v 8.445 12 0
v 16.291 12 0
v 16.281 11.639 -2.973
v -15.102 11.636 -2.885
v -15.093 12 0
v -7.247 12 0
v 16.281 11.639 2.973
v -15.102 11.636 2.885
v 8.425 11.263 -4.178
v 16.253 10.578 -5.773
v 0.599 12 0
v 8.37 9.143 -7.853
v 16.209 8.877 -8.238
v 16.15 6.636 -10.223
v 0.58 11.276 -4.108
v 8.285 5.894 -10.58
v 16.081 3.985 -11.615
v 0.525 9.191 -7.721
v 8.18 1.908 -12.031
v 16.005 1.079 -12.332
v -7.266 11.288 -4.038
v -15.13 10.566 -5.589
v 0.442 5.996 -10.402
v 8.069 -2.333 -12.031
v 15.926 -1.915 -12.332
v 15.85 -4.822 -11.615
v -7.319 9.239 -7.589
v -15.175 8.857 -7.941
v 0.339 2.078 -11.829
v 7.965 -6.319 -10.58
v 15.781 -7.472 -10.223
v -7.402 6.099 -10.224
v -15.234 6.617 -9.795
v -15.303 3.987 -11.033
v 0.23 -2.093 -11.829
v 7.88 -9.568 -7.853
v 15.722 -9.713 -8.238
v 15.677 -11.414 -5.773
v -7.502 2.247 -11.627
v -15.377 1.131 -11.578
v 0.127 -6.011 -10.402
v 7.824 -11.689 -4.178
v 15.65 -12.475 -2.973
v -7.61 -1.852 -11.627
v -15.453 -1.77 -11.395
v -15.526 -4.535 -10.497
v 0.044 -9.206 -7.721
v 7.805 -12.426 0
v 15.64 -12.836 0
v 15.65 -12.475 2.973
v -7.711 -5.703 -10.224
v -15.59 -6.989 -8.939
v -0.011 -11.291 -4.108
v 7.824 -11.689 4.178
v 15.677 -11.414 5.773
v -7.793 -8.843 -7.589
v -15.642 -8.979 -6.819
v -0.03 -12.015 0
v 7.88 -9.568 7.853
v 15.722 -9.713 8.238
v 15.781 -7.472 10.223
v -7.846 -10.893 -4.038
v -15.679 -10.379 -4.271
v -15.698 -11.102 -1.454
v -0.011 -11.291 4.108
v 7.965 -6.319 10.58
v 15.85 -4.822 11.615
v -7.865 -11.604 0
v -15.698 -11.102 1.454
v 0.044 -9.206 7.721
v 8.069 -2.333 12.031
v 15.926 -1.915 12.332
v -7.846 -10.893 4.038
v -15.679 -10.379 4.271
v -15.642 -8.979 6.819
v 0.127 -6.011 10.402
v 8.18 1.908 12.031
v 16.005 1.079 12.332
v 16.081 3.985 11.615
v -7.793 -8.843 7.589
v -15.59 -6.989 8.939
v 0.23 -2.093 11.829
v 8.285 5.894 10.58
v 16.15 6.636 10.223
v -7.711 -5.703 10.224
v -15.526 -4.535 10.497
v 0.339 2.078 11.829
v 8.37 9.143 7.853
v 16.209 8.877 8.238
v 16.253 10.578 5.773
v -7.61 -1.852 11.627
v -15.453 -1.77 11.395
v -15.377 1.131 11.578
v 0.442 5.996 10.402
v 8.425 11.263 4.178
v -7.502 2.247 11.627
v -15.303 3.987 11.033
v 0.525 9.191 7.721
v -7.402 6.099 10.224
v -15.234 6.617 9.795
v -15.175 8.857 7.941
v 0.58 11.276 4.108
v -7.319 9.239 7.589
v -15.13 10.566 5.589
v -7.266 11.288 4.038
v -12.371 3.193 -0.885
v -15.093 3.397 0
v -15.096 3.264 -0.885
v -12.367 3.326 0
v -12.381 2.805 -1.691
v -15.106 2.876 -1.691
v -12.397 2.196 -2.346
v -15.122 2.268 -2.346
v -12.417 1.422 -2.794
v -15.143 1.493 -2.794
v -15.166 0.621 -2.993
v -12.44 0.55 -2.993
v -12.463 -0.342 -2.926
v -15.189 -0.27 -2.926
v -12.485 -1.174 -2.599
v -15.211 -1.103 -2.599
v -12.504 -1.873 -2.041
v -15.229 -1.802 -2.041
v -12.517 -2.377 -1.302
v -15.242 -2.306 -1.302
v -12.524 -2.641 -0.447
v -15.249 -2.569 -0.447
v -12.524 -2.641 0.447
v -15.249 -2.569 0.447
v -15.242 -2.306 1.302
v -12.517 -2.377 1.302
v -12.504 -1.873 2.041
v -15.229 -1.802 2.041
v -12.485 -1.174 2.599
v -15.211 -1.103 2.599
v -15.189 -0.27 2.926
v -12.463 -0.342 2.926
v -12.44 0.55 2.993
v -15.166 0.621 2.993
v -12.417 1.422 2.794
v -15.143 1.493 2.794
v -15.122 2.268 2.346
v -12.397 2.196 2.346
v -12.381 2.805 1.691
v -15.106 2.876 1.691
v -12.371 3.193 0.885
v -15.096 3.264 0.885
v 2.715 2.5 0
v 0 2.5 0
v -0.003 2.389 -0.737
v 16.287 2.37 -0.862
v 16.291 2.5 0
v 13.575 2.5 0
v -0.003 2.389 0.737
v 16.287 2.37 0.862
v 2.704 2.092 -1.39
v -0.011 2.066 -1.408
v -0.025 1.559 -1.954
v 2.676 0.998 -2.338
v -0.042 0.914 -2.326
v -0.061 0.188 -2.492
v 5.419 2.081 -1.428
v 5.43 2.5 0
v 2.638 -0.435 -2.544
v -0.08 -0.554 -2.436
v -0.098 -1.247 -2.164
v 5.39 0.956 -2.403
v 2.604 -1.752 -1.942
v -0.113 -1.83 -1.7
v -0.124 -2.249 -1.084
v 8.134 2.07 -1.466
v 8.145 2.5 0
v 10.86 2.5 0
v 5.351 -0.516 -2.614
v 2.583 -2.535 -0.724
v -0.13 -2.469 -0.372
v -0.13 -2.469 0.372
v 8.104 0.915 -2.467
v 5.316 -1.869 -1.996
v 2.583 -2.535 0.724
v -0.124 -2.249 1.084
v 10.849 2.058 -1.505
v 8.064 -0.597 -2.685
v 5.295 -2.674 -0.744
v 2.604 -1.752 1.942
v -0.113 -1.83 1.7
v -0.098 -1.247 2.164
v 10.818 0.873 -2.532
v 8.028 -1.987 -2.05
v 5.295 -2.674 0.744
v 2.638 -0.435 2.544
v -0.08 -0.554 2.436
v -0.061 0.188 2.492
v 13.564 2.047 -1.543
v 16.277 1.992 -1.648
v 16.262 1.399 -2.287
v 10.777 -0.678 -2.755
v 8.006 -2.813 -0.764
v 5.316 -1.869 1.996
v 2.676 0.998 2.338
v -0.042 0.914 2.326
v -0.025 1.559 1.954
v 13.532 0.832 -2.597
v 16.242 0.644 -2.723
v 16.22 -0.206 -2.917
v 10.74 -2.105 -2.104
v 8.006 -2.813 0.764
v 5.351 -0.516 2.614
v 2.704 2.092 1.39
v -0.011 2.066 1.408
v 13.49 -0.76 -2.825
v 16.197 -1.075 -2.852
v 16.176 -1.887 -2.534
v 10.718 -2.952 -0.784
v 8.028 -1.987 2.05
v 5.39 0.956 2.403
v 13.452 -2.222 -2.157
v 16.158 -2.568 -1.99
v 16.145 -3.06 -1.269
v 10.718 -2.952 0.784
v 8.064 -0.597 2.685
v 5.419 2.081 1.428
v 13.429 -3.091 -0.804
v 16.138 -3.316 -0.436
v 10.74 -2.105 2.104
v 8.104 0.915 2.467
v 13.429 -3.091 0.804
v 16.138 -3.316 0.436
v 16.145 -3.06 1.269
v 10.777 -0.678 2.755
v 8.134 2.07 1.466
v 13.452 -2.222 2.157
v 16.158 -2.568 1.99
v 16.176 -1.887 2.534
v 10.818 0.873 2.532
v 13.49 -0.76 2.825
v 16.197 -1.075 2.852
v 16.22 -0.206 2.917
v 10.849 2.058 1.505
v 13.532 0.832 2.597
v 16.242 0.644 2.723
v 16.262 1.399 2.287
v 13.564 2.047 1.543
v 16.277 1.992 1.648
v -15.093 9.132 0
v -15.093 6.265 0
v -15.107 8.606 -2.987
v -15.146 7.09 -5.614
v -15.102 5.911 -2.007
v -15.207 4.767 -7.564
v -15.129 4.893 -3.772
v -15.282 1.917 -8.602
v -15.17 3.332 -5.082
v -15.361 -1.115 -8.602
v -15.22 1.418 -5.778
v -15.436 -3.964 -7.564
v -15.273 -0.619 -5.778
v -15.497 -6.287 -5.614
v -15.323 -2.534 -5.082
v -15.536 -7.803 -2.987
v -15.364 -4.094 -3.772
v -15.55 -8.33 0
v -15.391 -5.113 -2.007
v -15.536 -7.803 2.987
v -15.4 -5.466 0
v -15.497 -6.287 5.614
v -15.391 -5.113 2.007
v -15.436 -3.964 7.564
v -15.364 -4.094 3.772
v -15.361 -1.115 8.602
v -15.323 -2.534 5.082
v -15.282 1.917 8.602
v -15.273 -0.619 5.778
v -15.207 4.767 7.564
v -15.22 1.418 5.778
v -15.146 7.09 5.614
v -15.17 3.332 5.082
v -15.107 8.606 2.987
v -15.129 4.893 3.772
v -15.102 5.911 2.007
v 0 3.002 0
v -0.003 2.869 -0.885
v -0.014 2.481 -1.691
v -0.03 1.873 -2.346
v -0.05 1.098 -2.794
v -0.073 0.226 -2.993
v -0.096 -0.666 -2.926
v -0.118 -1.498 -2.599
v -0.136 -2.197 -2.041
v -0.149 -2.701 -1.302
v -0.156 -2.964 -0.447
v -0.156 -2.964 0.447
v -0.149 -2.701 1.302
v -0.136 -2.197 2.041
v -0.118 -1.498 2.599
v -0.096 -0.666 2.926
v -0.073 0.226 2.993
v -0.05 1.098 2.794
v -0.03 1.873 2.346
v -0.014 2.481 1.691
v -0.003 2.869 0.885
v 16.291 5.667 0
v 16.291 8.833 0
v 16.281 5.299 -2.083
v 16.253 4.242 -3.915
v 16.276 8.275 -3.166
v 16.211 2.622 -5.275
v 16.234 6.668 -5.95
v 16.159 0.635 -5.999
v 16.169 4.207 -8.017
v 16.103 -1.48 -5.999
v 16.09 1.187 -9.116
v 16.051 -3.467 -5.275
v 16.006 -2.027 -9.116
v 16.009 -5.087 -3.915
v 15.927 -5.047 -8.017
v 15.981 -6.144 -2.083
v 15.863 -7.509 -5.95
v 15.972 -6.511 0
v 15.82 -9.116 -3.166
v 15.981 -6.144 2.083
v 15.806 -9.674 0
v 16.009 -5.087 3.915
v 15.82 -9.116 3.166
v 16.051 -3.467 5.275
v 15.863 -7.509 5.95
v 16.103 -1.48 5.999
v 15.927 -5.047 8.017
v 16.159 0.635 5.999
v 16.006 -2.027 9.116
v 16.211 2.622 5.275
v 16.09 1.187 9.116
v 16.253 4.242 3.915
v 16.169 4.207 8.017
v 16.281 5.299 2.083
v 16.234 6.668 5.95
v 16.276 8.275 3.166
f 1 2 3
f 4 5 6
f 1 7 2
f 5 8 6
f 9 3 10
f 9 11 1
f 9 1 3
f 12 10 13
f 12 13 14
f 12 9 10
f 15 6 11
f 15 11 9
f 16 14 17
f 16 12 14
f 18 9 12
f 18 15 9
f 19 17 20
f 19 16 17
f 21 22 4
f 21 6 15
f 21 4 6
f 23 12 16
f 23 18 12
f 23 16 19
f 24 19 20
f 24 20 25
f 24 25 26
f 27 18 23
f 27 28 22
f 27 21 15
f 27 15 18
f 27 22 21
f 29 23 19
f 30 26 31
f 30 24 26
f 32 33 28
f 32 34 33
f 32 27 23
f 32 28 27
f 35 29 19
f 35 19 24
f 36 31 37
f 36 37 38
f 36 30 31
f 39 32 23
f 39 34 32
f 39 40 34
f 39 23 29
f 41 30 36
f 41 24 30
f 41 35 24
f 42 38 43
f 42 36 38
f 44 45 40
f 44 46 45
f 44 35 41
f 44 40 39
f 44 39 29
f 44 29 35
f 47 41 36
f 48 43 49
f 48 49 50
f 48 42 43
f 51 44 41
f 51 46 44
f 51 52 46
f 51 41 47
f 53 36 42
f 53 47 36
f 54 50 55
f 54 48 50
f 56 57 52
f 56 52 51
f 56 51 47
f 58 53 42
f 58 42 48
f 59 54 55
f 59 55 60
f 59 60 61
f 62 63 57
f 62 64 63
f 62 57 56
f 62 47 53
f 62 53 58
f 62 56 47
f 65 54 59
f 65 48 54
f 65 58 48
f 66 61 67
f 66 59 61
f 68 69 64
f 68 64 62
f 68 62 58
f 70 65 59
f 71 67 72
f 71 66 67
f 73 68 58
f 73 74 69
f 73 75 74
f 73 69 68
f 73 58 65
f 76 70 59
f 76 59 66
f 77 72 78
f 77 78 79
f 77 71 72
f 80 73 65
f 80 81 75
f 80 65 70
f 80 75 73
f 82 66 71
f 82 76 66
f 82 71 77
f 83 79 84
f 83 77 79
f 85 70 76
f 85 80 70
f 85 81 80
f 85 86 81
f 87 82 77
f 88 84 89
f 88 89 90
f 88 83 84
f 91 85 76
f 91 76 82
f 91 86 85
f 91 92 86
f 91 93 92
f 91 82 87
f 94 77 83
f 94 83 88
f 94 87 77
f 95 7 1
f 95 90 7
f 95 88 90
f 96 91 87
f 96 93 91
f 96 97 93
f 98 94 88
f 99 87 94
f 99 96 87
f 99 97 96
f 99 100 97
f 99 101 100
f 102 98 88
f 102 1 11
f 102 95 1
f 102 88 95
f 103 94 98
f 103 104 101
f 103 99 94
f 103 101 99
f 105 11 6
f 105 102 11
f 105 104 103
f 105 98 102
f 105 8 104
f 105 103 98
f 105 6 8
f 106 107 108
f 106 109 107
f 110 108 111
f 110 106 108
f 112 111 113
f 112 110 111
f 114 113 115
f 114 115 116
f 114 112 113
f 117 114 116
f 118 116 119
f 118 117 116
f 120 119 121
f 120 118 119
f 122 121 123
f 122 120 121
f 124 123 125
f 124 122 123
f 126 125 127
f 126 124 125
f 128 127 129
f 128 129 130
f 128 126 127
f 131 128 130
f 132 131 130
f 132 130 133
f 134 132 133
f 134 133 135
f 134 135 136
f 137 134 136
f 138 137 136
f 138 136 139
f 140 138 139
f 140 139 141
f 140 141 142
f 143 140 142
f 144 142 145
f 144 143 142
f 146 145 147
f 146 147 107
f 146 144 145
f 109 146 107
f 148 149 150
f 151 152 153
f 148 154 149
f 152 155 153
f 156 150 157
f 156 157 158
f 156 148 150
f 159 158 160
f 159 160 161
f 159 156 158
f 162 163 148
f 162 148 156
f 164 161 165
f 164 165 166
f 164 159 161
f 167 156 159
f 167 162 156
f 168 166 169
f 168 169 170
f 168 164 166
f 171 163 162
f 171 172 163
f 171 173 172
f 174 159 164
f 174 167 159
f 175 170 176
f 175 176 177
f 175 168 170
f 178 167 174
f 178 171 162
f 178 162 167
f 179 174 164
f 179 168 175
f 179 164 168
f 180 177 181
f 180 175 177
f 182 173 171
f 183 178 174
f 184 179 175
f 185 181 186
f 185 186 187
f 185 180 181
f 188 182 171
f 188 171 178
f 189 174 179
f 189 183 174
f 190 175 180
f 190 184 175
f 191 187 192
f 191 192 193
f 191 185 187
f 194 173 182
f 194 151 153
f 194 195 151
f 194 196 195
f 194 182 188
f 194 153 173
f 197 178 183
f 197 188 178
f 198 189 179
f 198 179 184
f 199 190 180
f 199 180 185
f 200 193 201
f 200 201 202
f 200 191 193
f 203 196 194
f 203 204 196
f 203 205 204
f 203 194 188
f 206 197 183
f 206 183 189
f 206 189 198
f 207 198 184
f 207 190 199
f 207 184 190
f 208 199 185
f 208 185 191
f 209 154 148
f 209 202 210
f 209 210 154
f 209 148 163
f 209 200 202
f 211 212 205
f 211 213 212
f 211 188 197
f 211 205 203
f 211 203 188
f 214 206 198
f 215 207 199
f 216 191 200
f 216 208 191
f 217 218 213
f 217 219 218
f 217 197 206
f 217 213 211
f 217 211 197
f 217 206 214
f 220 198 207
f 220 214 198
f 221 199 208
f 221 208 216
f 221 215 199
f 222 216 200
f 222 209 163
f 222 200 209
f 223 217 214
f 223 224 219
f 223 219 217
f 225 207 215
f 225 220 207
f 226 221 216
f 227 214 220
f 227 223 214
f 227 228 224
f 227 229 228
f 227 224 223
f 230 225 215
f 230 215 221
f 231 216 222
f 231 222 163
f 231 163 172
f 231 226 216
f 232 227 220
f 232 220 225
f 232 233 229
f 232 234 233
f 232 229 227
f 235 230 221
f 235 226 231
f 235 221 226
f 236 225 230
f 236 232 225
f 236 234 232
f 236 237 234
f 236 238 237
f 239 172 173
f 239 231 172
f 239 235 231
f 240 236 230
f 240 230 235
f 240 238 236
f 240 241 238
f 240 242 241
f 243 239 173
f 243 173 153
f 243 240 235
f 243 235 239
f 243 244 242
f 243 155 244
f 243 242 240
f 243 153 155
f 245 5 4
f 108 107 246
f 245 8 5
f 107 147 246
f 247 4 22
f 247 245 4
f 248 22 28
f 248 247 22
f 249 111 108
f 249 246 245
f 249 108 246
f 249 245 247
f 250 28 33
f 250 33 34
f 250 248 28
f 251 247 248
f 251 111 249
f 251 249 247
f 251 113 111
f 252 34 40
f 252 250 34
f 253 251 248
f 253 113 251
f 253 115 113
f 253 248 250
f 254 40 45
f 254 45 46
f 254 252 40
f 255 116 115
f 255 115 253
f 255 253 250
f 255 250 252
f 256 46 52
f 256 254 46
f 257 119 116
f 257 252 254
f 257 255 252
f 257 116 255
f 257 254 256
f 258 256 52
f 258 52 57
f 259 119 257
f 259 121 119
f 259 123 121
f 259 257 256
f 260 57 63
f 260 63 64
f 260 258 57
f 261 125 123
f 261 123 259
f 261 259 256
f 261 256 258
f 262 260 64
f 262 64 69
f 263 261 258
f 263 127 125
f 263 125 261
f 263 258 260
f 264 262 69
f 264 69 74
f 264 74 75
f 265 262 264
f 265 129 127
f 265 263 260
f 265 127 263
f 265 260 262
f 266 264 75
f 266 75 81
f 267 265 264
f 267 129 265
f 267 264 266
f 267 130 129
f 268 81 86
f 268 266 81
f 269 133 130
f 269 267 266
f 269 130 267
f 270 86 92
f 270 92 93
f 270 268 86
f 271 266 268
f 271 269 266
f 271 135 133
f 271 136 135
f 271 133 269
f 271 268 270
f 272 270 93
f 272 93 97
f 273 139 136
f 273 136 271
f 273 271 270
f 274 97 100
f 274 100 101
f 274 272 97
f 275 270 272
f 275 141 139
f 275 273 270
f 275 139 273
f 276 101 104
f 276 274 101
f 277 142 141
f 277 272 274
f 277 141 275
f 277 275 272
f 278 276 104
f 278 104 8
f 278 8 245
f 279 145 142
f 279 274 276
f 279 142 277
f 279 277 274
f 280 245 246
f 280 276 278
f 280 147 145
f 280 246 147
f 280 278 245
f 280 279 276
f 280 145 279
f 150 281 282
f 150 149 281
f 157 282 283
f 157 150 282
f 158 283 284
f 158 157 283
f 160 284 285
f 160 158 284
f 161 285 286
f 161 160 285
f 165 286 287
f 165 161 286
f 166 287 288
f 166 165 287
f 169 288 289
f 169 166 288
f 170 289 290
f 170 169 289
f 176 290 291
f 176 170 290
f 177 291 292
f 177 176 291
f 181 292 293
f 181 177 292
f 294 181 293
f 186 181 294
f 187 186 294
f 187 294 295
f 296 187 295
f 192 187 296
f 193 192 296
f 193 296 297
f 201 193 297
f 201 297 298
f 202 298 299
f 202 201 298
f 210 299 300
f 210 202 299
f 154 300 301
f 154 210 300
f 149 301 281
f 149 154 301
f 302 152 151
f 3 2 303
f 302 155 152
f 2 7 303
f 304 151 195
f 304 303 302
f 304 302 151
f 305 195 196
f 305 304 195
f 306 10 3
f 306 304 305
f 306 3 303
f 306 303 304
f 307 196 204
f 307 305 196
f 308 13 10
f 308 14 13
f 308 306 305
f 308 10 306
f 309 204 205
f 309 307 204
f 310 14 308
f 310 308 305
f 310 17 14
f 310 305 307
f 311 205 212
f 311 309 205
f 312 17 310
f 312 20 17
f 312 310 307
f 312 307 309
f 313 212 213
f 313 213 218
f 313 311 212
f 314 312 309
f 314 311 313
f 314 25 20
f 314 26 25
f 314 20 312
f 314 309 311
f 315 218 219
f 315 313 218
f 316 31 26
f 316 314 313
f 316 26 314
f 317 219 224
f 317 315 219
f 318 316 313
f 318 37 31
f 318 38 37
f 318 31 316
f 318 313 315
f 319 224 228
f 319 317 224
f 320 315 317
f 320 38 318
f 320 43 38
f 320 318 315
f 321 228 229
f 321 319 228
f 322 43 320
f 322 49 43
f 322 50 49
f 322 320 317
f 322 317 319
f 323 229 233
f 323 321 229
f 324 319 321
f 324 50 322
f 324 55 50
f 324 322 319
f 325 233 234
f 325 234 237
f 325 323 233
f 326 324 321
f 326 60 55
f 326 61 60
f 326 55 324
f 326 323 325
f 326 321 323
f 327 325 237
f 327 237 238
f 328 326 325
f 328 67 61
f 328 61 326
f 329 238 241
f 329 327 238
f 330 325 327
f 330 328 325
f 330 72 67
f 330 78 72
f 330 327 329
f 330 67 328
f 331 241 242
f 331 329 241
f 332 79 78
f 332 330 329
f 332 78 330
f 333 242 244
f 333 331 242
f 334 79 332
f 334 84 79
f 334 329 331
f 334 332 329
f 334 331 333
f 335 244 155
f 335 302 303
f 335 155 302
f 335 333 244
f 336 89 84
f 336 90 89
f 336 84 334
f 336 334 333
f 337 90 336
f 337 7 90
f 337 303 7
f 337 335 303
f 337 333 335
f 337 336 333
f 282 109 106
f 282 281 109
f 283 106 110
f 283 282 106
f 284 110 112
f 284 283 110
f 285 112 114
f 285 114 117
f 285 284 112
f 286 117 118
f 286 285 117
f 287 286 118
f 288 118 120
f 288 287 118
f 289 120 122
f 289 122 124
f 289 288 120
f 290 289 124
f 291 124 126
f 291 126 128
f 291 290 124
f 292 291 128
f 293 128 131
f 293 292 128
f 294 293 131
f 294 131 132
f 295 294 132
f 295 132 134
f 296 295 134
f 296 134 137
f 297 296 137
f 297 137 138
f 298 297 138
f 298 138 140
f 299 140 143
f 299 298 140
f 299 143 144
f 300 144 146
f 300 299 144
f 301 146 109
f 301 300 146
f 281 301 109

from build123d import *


with BuildPart() as f1:
    # F0 (on Top) → F1 (revolve)
    with BuildSketch(Plane.XY):
        Polygon((-12.367387, 3.325909), (0, 3.002057), (0, 12), (-15.092844, 12), (-15.092844, 3.397277), align=None)
        Polygon((0, 3.002057), (0, 2.5), (16.290502, 2.5), (16.290502, 12), (0, 12), align=None)
    revolve(axis=Axis((-6.948064, 0.181941, 0), (-0.999657, 0.026177, 0)))


solid = f1.part
